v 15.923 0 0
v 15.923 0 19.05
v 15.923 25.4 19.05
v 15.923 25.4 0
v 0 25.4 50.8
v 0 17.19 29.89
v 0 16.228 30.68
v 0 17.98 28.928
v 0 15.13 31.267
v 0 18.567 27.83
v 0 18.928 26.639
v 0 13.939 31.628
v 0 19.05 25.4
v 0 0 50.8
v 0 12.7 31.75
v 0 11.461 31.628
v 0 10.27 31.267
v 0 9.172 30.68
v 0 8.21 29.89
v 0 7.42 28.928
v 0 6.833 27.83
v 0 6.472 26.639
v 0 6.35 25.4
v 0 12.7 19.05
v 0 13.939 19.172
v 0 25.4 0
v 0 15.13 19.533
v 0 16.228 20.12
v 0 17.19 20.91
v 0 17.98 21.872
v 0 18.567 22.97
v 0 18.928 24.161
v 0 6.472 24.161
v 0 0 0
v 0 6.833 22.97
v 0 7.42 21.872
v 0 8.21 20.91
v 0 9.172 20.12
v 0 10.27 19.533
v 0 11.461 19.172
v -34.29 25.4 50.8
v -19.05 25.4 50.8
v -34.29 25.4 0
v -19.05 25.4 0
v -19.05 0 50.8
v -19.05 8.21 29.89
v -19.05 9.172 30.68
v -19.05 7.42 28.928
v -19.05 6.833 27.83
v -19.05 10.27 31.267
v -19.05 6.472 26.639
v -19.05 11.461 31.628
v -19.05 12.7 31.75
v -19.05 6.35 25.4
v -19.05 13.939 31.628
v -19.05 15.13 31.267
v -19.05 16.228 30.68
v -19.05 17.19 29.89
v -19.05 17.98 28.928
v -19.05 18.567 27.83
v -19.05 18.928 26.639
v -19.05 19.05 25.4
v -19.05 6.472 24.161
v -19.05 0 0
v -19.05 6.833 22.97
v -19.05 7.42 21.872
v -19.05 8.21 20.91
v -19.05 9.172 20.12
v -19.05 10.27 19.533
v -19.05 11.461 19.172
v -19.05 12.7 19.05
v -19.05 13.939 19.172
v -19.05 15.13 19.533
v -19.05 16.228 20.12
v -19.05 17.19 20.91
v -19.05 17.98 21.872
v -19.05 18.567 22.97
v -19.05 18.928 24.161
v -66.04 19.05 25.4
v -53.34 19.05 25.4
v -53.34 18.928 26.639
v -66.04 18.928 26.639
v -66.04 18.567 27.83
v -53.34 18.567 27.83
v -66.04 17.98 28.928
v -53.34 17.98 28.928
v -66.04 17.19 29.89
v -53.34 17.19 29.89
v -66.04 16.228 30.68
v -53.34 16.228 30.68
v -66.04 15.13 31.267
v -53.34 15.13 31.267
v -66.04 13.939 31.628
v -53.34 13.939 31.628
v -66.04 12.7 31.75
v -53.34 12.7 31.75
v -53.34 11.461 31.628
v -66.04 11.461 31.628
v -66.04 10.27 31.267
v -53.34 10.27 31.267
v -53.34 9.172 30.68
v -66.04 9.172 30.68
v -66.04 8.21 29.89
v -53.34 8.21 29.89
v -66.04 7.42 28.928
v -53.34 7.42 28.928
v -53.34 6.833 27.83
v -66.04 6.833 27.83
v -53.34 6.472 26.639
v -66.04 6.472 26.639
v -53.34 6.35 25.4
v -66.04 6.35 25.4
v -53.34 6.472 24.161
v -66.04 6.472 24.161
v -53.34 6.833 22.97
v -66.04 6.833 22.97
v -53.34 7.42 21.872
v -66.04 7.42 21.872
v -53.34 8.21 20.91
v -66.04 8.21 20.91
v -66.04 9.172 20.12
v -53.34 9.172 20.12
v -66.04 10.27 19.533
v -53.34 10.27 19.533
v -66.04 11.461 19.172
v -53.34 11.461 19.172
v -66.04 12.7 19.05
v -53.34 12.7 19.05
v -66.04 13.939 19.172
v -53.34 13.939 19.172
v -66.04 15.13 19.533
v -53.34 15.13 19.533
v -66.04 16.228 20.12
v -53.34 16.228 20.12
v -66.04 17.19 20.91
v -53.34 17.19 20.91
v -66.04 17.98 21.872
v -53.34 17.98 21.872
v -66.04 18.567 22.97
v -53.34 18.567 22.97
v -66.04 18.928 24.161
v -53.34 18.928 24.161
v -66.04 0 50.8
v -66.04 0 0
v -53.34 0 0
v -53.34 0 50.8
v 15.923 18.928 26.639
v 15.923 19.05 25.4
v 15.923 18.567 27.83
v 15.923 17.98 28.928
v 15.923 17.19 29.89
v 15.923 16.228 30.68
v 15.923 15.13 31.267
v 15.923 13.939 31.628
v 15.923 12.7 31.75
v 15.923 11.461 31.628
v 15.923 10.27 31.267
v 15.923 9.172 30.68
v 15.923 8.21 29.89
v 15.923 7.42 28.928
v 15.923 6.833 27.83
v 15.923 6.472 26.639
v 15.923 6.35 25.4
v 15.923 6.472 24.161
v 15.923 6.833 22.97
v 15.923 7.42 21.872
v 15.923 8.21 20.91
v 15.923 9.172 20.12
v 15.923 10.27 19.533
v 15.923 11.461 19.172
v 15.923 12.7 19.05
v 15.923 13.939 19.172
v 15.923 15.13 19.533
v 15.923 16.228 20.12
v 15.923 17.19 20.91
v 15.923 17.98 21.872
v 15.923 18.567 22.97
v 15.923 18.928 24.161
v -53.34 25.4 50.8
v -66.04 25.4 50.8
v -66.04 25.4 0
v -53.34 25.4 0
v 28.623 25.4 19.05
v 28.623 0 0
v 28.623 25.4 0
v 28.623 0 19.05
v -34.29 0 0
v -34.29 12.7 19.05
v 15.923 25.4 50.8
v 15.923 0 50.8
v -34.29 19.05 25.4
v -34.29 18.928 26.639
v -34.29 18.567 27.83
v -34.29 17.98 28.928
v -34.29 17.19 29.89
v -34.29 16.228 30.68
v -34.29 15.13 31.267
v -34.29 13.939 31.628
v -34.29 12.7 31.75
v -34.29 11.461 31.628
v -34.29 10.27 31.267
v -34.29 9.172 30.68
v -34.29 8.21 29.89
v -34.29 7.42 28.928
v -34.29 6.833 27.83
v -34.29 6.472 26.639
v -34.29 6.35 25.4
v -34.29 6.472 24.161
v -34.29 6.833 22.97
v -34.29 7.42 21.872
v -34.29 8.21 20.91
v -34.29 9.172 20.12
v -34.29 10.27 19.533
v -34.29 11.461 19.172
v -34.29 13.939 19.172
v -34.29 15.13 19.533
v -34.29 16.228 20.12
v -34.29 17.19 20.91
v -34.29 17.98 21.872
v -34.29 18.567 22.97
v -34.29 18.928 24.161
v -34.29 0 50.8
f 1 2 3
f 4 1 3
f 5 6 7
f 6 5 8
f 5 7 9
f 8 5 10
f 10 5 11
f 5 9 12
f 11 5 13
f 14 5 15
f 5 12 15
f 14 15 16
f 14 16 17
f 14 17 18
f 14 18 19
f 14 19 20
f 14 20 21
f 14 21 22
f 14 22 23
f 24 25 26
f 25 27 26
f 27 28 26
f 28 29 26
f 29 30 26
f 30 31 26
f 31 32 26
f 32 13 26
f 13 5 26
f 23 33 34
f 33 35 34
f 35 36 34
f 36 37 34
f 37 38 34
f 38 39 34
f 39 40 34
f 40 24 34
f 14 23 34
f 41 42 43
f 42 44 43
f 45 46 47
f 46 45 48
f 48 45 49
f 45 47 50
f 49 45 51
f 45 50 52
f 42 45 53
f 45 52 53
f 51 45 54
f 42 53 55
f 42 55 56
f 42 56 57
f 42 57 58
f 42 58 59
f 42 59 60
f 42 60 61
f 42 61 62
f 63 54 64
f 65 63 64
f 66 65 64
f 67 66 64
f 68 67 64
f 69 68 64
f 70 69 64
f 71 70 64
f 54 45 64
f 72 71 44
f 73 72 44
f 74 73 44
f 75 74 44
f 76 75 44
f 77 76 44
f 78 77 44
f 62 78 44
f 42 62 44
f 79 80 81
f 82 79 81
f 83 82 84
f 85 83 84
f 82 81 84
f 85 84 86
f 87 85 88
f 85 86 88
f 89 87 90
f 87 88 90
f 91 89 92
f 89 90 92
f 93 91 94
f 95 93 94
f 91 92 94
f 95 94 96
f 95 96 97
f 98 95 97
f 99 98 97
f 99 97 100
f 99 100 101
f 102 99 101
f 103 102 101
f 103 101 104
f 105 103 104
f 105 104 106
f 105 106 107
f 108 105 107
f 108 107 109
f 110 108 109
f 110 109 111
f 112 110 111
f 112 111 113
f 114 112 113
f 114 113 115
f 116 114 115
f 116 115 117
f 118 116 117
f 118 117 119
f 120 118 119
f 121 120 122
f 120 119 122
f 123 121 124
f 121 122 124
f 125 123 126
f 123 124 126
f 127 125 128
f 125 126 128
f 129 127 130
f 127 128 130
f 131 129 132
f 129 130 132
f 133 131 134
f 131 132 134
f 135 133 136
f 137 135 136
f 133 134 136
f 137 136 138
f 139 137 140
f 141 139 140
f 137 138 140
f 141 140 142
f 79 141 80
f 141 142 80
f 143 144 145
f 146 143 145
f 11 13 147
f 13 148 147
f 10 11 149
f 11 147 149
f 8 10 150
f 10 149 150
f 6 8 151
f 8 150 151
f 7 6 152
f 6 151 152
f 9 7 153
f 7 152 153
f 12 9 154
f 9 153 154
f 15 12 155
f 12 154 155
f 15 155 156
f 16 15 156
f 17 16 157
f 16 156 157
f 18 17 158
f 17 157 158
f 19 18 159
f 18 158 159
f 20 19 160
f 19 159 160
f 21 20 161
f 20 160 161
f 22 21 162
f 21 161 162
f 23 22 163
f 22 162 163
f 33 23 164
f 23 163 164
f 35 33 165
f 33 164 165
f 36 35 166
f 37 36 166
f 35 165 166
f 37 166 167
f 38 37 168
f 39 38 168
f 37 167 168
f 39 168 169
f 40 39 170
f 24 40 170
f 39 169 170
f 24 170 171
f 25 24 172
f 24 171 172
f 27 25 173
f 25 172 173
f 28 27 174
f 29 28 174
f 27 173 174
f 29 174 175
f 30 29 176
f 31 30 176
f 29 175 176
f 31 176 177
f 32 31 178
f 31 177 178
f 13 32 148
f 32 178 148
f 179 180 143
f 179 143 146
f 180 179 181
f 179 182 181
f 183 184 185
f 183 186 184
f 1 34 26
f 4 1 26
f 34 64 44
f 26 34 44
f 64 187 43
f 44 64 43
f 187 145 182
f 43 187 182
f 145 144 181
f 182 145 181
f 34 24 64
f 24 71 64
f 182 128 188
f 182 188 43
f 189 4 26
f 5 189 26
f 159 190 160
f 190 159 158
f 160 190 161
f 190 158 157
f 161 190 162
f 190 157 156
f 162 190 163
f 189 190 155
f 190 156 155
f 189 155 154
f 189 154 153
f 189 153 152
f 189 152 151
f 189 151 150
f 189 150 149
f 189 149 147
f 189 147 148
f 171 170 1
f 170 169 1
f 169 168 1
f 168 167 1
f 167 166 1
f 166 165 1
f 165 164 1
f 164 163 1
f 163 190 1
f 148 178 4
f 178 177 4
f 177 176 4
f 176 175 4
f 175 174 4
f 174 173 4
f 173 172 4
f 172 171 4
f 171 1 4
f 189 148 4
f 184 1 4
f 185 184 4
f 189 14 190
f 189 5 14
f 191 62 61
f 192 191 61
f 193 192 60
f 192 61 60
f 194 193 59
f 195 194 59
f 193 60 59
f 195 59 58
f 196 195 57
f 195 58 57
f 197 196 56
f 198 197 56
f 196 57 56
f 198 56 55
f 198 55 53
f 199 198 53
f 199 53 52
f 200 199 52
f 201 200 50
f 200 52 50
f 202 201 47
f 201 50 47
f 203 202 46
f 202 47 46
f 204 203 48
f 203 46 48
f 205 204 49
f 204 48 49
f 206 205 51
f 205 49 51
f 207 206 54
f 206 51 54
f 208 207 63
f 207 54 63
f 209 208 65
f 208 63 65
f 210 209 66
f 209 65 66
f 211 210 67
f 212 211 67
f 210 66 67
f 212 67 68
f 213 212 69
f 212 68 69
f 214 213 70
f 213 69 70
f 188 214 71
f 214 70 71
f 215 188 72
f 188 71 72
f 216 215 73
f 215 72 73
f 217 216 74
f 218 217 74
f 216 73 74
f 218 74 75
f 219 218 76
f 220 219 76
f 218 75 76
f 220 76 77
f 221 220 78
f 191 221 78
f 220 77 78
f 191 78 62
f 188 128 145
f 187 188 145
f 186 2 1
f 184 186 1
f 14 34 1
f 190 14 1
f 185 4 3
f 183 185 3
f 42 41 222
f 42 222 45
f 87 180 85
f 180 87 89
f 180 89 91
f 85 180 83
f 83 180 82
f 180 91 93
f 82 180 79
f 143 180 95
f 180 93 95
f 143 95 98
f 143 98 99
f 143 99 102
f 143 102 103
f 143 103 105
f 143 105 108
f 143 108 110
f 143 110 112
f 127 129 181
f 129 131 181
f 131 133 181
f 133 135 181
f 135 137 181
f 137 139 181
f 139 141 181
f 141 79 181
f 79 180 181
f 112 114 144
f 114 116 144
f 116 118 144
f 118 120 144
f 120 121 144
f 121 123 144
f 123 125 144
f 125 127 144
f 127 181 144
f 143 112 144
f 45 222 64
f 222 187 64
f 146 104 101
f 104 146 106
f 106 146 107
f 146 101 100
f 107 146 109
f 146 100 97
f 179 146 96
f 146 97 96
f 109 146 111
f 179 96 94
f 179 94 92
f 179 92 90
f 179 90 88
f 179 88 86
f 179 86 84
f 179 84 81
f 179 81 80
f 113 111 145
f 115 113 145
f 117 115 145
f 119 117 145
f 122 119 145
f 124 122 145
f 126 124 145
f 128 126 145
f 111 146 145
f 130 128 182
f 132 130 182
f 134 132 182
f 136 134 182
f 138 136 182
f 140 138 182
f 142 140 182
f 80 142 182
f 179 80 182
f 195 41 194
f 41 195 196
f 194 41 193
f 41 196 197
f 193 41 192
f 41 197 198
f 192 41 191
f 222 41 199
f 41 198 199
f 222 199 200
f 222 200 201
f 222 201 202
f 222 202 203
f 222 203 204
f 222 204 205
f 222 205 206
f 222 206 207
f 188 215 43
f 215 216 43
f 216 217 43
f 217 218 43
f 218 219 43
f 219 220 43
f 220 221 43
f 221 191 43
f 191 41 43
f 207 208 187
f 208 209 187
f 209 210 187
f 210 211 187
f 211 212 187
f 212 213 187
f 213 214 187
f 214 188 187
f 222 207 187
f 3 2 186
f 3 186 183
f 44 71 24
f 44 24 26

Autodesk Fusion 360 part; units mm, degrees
sketch "Sketch1" plane through (0, 0, 0) normal (0, 0, 1) x (1, 0, 0)
  line L0 (-66.04, 0) -> (-53.34, 0)
  line L1 (-53.34, 0) -> (-53.34, 25.4)
  line L2 (-53.34, 25.4) -> (-66.04, 25.4)
  line L3 (-66.04, 25.4) -> (-66.04, 0)
  line L4 (-34.29, 0) -> (-19.05, 0)
  line L5 (-19.05, 0) -> (-19.05, 25.4)
  line L6 (-19.05, 25.4) -> (-34.29, 25.4)
  line L7 (-34.29, 25.4) -> (-34.29, 0)
  line L8 (0, 0) -> (15.9232, 0)
  line L9 (15.9232, 0) -> (15.9232, 25.4)
  line L10 (15.9232, 25.4) -> (0, 25.4)
  line L11 (0, 25.4) -> (0, 0)
  dimension "d5" = 12.7
  dimension "d6" = 25.4
  dimension "d7" = 19.05
  dimension "d8" = 25.4
  dimension "d9" = 19.05
  dimension "d10" = 25.4
extrude "Extrude1" add sketch "Sketch1" along normal blind 50.8 makes body 1 at (0, 16.9333, 33.8667) makes body 2 at (-34.29, 16.9333, 33.8667) makes body 3 at (-66.04, 16.9333, 33.8667)
sketch "Sketch2" plane through (15.9232, 0, 0) normal (1, 0, 0) x (0, 1, 0)
  line L0 (0, 0) -> (25.4, 0)
  line L1 (25.4, 0) -> (25.4, 50.8)
  line L2 (25.4, 50.8) -> (0, 50.8)
  line L3 (0, 50.8) -> (0, 0)
  line L4 (12.7, 0) -> (12.7, 53.34)
  line L5 (25.4, 25.4) -> (-2.54, 25.4)
  circle A0 centre (12.7, 25.4) radius 6.35
  dimension "d15" = 12.7
extrude "Extrude2" cut sketch "Sketch2" against normal blind 96.52 contours L4 L5 A0 | L4 L5 A0 | L4 L5 A0 | L4 L5 A0 bodies 1 2 3
sketch "Sketch3" plane through (-53.34, 0, 0) normal (1, 0, 0) x (0, 1, 0)
  circle A0 centre (12.7, 25.4) radius 6.35
  line L0 (0, 0) -> (25.4, 0)
  line L1 (25.4, 0) -> (25.4, 50.8)
  line L2 (25.4, 50.8) -> (0, 50.8)
  line L3 (0, 50.8) -> (0, 0)
  line L4 (12.7, 25.4) -> (12.7, 0)
  line L5 (12.7, 19.05) -> (0, 0)
  line L6 (12.7, 19.05) -> (25.4, 0)
  line L7 (25.4, 0) -> (0, 0)
extrude "Extrude3" add sketch "Sketch3" along normal blind 68.58 contours L0 L4 L6 L7 | L0 L4 L5 L7 bodies 1 2 3
sketch "Sketch4" plane through (15.9232, 0, 0) normal (1, 0, 0) x (0, 1, 0)
  circle A0 centre (12.7, 25.4) radius 6.35
  line L0 (0, 0) -> (25.4, 0)
  line L1 (25.4, 0) -> (25.4, 50.8)
  line L2 (25.4, 50.8) -> (0, 50.8)
  line L3 (0, 50.8) -> (0, 0)
  line L4 (12.7, 0) -> (12.7, 50.8)
  line L5 (12.7, 19.05) -> (0, 19.05)
  line L6 (12.7, 19.05) -> (25.4, 19.05)
  line L7 (0, 19.05) -> (25.4, 19.05)
  line L8 (25.4, 19.05) -> (25.4, 0)
  line L9 (25.4, 0) -> (0, 0)
  line L10 (0, 0) -> (0, 19.05)
extrude "Extrude4" add sketch "Sketch4" along normal blind 12.7 separate body contours L0 L1 L4 L6 L7 L8 L9 | L0 L3 L4 L5 L7 L9 L10 makes body 4
sketch "Sketch5" plane through (0, 0, 19.05) normal (0, 0, 1) x (-1, 0, 0)
  line L0 (-15.9232, -25.4) -> (-15.9232, 0)
  line L1 (-15.9232, 0) -> (-28.6232, 0)
  line L2 (-28.6232, 0) -> (-28.6232, -25.4)
  line L3 (-28.6232, -25.4) -> (-15.9232, -25.4)
  line L4 (-17.78, -12.7) -> (-27.94, -12.7) construction
  line L5 (-27.94, -12.7) -> (-27.94, -20.32) construction
  line L6 (-27.94, -20.32) -> (-17.78, -20.32) construction
  line L7 (-17.78, -20.32) -> (-17.78, -12.7) construction
  dimension "d23" = 2.54
equation "SorterLength = 1 in"
equation "SorterWidth = 0.5 in"
equation "WallWidth = SorterWidth * 1.2"
equation "WallLength = SorterLength * 1.2"
equation "d5 = SorterWidth"
equation "d6 = SorterLength"
equation "d7 = 1.5 * SorterWidth"
equation "d8 = SorterLength"
equation "d9 = 1.5 * SorterWidth"
equation "d10 = SorterLength"
equation "depth = 2 in"
equation "d12 = depth"
equation "AxleHoleDia = 0.5 in"
equation "d15 = AxleHoleDia"
